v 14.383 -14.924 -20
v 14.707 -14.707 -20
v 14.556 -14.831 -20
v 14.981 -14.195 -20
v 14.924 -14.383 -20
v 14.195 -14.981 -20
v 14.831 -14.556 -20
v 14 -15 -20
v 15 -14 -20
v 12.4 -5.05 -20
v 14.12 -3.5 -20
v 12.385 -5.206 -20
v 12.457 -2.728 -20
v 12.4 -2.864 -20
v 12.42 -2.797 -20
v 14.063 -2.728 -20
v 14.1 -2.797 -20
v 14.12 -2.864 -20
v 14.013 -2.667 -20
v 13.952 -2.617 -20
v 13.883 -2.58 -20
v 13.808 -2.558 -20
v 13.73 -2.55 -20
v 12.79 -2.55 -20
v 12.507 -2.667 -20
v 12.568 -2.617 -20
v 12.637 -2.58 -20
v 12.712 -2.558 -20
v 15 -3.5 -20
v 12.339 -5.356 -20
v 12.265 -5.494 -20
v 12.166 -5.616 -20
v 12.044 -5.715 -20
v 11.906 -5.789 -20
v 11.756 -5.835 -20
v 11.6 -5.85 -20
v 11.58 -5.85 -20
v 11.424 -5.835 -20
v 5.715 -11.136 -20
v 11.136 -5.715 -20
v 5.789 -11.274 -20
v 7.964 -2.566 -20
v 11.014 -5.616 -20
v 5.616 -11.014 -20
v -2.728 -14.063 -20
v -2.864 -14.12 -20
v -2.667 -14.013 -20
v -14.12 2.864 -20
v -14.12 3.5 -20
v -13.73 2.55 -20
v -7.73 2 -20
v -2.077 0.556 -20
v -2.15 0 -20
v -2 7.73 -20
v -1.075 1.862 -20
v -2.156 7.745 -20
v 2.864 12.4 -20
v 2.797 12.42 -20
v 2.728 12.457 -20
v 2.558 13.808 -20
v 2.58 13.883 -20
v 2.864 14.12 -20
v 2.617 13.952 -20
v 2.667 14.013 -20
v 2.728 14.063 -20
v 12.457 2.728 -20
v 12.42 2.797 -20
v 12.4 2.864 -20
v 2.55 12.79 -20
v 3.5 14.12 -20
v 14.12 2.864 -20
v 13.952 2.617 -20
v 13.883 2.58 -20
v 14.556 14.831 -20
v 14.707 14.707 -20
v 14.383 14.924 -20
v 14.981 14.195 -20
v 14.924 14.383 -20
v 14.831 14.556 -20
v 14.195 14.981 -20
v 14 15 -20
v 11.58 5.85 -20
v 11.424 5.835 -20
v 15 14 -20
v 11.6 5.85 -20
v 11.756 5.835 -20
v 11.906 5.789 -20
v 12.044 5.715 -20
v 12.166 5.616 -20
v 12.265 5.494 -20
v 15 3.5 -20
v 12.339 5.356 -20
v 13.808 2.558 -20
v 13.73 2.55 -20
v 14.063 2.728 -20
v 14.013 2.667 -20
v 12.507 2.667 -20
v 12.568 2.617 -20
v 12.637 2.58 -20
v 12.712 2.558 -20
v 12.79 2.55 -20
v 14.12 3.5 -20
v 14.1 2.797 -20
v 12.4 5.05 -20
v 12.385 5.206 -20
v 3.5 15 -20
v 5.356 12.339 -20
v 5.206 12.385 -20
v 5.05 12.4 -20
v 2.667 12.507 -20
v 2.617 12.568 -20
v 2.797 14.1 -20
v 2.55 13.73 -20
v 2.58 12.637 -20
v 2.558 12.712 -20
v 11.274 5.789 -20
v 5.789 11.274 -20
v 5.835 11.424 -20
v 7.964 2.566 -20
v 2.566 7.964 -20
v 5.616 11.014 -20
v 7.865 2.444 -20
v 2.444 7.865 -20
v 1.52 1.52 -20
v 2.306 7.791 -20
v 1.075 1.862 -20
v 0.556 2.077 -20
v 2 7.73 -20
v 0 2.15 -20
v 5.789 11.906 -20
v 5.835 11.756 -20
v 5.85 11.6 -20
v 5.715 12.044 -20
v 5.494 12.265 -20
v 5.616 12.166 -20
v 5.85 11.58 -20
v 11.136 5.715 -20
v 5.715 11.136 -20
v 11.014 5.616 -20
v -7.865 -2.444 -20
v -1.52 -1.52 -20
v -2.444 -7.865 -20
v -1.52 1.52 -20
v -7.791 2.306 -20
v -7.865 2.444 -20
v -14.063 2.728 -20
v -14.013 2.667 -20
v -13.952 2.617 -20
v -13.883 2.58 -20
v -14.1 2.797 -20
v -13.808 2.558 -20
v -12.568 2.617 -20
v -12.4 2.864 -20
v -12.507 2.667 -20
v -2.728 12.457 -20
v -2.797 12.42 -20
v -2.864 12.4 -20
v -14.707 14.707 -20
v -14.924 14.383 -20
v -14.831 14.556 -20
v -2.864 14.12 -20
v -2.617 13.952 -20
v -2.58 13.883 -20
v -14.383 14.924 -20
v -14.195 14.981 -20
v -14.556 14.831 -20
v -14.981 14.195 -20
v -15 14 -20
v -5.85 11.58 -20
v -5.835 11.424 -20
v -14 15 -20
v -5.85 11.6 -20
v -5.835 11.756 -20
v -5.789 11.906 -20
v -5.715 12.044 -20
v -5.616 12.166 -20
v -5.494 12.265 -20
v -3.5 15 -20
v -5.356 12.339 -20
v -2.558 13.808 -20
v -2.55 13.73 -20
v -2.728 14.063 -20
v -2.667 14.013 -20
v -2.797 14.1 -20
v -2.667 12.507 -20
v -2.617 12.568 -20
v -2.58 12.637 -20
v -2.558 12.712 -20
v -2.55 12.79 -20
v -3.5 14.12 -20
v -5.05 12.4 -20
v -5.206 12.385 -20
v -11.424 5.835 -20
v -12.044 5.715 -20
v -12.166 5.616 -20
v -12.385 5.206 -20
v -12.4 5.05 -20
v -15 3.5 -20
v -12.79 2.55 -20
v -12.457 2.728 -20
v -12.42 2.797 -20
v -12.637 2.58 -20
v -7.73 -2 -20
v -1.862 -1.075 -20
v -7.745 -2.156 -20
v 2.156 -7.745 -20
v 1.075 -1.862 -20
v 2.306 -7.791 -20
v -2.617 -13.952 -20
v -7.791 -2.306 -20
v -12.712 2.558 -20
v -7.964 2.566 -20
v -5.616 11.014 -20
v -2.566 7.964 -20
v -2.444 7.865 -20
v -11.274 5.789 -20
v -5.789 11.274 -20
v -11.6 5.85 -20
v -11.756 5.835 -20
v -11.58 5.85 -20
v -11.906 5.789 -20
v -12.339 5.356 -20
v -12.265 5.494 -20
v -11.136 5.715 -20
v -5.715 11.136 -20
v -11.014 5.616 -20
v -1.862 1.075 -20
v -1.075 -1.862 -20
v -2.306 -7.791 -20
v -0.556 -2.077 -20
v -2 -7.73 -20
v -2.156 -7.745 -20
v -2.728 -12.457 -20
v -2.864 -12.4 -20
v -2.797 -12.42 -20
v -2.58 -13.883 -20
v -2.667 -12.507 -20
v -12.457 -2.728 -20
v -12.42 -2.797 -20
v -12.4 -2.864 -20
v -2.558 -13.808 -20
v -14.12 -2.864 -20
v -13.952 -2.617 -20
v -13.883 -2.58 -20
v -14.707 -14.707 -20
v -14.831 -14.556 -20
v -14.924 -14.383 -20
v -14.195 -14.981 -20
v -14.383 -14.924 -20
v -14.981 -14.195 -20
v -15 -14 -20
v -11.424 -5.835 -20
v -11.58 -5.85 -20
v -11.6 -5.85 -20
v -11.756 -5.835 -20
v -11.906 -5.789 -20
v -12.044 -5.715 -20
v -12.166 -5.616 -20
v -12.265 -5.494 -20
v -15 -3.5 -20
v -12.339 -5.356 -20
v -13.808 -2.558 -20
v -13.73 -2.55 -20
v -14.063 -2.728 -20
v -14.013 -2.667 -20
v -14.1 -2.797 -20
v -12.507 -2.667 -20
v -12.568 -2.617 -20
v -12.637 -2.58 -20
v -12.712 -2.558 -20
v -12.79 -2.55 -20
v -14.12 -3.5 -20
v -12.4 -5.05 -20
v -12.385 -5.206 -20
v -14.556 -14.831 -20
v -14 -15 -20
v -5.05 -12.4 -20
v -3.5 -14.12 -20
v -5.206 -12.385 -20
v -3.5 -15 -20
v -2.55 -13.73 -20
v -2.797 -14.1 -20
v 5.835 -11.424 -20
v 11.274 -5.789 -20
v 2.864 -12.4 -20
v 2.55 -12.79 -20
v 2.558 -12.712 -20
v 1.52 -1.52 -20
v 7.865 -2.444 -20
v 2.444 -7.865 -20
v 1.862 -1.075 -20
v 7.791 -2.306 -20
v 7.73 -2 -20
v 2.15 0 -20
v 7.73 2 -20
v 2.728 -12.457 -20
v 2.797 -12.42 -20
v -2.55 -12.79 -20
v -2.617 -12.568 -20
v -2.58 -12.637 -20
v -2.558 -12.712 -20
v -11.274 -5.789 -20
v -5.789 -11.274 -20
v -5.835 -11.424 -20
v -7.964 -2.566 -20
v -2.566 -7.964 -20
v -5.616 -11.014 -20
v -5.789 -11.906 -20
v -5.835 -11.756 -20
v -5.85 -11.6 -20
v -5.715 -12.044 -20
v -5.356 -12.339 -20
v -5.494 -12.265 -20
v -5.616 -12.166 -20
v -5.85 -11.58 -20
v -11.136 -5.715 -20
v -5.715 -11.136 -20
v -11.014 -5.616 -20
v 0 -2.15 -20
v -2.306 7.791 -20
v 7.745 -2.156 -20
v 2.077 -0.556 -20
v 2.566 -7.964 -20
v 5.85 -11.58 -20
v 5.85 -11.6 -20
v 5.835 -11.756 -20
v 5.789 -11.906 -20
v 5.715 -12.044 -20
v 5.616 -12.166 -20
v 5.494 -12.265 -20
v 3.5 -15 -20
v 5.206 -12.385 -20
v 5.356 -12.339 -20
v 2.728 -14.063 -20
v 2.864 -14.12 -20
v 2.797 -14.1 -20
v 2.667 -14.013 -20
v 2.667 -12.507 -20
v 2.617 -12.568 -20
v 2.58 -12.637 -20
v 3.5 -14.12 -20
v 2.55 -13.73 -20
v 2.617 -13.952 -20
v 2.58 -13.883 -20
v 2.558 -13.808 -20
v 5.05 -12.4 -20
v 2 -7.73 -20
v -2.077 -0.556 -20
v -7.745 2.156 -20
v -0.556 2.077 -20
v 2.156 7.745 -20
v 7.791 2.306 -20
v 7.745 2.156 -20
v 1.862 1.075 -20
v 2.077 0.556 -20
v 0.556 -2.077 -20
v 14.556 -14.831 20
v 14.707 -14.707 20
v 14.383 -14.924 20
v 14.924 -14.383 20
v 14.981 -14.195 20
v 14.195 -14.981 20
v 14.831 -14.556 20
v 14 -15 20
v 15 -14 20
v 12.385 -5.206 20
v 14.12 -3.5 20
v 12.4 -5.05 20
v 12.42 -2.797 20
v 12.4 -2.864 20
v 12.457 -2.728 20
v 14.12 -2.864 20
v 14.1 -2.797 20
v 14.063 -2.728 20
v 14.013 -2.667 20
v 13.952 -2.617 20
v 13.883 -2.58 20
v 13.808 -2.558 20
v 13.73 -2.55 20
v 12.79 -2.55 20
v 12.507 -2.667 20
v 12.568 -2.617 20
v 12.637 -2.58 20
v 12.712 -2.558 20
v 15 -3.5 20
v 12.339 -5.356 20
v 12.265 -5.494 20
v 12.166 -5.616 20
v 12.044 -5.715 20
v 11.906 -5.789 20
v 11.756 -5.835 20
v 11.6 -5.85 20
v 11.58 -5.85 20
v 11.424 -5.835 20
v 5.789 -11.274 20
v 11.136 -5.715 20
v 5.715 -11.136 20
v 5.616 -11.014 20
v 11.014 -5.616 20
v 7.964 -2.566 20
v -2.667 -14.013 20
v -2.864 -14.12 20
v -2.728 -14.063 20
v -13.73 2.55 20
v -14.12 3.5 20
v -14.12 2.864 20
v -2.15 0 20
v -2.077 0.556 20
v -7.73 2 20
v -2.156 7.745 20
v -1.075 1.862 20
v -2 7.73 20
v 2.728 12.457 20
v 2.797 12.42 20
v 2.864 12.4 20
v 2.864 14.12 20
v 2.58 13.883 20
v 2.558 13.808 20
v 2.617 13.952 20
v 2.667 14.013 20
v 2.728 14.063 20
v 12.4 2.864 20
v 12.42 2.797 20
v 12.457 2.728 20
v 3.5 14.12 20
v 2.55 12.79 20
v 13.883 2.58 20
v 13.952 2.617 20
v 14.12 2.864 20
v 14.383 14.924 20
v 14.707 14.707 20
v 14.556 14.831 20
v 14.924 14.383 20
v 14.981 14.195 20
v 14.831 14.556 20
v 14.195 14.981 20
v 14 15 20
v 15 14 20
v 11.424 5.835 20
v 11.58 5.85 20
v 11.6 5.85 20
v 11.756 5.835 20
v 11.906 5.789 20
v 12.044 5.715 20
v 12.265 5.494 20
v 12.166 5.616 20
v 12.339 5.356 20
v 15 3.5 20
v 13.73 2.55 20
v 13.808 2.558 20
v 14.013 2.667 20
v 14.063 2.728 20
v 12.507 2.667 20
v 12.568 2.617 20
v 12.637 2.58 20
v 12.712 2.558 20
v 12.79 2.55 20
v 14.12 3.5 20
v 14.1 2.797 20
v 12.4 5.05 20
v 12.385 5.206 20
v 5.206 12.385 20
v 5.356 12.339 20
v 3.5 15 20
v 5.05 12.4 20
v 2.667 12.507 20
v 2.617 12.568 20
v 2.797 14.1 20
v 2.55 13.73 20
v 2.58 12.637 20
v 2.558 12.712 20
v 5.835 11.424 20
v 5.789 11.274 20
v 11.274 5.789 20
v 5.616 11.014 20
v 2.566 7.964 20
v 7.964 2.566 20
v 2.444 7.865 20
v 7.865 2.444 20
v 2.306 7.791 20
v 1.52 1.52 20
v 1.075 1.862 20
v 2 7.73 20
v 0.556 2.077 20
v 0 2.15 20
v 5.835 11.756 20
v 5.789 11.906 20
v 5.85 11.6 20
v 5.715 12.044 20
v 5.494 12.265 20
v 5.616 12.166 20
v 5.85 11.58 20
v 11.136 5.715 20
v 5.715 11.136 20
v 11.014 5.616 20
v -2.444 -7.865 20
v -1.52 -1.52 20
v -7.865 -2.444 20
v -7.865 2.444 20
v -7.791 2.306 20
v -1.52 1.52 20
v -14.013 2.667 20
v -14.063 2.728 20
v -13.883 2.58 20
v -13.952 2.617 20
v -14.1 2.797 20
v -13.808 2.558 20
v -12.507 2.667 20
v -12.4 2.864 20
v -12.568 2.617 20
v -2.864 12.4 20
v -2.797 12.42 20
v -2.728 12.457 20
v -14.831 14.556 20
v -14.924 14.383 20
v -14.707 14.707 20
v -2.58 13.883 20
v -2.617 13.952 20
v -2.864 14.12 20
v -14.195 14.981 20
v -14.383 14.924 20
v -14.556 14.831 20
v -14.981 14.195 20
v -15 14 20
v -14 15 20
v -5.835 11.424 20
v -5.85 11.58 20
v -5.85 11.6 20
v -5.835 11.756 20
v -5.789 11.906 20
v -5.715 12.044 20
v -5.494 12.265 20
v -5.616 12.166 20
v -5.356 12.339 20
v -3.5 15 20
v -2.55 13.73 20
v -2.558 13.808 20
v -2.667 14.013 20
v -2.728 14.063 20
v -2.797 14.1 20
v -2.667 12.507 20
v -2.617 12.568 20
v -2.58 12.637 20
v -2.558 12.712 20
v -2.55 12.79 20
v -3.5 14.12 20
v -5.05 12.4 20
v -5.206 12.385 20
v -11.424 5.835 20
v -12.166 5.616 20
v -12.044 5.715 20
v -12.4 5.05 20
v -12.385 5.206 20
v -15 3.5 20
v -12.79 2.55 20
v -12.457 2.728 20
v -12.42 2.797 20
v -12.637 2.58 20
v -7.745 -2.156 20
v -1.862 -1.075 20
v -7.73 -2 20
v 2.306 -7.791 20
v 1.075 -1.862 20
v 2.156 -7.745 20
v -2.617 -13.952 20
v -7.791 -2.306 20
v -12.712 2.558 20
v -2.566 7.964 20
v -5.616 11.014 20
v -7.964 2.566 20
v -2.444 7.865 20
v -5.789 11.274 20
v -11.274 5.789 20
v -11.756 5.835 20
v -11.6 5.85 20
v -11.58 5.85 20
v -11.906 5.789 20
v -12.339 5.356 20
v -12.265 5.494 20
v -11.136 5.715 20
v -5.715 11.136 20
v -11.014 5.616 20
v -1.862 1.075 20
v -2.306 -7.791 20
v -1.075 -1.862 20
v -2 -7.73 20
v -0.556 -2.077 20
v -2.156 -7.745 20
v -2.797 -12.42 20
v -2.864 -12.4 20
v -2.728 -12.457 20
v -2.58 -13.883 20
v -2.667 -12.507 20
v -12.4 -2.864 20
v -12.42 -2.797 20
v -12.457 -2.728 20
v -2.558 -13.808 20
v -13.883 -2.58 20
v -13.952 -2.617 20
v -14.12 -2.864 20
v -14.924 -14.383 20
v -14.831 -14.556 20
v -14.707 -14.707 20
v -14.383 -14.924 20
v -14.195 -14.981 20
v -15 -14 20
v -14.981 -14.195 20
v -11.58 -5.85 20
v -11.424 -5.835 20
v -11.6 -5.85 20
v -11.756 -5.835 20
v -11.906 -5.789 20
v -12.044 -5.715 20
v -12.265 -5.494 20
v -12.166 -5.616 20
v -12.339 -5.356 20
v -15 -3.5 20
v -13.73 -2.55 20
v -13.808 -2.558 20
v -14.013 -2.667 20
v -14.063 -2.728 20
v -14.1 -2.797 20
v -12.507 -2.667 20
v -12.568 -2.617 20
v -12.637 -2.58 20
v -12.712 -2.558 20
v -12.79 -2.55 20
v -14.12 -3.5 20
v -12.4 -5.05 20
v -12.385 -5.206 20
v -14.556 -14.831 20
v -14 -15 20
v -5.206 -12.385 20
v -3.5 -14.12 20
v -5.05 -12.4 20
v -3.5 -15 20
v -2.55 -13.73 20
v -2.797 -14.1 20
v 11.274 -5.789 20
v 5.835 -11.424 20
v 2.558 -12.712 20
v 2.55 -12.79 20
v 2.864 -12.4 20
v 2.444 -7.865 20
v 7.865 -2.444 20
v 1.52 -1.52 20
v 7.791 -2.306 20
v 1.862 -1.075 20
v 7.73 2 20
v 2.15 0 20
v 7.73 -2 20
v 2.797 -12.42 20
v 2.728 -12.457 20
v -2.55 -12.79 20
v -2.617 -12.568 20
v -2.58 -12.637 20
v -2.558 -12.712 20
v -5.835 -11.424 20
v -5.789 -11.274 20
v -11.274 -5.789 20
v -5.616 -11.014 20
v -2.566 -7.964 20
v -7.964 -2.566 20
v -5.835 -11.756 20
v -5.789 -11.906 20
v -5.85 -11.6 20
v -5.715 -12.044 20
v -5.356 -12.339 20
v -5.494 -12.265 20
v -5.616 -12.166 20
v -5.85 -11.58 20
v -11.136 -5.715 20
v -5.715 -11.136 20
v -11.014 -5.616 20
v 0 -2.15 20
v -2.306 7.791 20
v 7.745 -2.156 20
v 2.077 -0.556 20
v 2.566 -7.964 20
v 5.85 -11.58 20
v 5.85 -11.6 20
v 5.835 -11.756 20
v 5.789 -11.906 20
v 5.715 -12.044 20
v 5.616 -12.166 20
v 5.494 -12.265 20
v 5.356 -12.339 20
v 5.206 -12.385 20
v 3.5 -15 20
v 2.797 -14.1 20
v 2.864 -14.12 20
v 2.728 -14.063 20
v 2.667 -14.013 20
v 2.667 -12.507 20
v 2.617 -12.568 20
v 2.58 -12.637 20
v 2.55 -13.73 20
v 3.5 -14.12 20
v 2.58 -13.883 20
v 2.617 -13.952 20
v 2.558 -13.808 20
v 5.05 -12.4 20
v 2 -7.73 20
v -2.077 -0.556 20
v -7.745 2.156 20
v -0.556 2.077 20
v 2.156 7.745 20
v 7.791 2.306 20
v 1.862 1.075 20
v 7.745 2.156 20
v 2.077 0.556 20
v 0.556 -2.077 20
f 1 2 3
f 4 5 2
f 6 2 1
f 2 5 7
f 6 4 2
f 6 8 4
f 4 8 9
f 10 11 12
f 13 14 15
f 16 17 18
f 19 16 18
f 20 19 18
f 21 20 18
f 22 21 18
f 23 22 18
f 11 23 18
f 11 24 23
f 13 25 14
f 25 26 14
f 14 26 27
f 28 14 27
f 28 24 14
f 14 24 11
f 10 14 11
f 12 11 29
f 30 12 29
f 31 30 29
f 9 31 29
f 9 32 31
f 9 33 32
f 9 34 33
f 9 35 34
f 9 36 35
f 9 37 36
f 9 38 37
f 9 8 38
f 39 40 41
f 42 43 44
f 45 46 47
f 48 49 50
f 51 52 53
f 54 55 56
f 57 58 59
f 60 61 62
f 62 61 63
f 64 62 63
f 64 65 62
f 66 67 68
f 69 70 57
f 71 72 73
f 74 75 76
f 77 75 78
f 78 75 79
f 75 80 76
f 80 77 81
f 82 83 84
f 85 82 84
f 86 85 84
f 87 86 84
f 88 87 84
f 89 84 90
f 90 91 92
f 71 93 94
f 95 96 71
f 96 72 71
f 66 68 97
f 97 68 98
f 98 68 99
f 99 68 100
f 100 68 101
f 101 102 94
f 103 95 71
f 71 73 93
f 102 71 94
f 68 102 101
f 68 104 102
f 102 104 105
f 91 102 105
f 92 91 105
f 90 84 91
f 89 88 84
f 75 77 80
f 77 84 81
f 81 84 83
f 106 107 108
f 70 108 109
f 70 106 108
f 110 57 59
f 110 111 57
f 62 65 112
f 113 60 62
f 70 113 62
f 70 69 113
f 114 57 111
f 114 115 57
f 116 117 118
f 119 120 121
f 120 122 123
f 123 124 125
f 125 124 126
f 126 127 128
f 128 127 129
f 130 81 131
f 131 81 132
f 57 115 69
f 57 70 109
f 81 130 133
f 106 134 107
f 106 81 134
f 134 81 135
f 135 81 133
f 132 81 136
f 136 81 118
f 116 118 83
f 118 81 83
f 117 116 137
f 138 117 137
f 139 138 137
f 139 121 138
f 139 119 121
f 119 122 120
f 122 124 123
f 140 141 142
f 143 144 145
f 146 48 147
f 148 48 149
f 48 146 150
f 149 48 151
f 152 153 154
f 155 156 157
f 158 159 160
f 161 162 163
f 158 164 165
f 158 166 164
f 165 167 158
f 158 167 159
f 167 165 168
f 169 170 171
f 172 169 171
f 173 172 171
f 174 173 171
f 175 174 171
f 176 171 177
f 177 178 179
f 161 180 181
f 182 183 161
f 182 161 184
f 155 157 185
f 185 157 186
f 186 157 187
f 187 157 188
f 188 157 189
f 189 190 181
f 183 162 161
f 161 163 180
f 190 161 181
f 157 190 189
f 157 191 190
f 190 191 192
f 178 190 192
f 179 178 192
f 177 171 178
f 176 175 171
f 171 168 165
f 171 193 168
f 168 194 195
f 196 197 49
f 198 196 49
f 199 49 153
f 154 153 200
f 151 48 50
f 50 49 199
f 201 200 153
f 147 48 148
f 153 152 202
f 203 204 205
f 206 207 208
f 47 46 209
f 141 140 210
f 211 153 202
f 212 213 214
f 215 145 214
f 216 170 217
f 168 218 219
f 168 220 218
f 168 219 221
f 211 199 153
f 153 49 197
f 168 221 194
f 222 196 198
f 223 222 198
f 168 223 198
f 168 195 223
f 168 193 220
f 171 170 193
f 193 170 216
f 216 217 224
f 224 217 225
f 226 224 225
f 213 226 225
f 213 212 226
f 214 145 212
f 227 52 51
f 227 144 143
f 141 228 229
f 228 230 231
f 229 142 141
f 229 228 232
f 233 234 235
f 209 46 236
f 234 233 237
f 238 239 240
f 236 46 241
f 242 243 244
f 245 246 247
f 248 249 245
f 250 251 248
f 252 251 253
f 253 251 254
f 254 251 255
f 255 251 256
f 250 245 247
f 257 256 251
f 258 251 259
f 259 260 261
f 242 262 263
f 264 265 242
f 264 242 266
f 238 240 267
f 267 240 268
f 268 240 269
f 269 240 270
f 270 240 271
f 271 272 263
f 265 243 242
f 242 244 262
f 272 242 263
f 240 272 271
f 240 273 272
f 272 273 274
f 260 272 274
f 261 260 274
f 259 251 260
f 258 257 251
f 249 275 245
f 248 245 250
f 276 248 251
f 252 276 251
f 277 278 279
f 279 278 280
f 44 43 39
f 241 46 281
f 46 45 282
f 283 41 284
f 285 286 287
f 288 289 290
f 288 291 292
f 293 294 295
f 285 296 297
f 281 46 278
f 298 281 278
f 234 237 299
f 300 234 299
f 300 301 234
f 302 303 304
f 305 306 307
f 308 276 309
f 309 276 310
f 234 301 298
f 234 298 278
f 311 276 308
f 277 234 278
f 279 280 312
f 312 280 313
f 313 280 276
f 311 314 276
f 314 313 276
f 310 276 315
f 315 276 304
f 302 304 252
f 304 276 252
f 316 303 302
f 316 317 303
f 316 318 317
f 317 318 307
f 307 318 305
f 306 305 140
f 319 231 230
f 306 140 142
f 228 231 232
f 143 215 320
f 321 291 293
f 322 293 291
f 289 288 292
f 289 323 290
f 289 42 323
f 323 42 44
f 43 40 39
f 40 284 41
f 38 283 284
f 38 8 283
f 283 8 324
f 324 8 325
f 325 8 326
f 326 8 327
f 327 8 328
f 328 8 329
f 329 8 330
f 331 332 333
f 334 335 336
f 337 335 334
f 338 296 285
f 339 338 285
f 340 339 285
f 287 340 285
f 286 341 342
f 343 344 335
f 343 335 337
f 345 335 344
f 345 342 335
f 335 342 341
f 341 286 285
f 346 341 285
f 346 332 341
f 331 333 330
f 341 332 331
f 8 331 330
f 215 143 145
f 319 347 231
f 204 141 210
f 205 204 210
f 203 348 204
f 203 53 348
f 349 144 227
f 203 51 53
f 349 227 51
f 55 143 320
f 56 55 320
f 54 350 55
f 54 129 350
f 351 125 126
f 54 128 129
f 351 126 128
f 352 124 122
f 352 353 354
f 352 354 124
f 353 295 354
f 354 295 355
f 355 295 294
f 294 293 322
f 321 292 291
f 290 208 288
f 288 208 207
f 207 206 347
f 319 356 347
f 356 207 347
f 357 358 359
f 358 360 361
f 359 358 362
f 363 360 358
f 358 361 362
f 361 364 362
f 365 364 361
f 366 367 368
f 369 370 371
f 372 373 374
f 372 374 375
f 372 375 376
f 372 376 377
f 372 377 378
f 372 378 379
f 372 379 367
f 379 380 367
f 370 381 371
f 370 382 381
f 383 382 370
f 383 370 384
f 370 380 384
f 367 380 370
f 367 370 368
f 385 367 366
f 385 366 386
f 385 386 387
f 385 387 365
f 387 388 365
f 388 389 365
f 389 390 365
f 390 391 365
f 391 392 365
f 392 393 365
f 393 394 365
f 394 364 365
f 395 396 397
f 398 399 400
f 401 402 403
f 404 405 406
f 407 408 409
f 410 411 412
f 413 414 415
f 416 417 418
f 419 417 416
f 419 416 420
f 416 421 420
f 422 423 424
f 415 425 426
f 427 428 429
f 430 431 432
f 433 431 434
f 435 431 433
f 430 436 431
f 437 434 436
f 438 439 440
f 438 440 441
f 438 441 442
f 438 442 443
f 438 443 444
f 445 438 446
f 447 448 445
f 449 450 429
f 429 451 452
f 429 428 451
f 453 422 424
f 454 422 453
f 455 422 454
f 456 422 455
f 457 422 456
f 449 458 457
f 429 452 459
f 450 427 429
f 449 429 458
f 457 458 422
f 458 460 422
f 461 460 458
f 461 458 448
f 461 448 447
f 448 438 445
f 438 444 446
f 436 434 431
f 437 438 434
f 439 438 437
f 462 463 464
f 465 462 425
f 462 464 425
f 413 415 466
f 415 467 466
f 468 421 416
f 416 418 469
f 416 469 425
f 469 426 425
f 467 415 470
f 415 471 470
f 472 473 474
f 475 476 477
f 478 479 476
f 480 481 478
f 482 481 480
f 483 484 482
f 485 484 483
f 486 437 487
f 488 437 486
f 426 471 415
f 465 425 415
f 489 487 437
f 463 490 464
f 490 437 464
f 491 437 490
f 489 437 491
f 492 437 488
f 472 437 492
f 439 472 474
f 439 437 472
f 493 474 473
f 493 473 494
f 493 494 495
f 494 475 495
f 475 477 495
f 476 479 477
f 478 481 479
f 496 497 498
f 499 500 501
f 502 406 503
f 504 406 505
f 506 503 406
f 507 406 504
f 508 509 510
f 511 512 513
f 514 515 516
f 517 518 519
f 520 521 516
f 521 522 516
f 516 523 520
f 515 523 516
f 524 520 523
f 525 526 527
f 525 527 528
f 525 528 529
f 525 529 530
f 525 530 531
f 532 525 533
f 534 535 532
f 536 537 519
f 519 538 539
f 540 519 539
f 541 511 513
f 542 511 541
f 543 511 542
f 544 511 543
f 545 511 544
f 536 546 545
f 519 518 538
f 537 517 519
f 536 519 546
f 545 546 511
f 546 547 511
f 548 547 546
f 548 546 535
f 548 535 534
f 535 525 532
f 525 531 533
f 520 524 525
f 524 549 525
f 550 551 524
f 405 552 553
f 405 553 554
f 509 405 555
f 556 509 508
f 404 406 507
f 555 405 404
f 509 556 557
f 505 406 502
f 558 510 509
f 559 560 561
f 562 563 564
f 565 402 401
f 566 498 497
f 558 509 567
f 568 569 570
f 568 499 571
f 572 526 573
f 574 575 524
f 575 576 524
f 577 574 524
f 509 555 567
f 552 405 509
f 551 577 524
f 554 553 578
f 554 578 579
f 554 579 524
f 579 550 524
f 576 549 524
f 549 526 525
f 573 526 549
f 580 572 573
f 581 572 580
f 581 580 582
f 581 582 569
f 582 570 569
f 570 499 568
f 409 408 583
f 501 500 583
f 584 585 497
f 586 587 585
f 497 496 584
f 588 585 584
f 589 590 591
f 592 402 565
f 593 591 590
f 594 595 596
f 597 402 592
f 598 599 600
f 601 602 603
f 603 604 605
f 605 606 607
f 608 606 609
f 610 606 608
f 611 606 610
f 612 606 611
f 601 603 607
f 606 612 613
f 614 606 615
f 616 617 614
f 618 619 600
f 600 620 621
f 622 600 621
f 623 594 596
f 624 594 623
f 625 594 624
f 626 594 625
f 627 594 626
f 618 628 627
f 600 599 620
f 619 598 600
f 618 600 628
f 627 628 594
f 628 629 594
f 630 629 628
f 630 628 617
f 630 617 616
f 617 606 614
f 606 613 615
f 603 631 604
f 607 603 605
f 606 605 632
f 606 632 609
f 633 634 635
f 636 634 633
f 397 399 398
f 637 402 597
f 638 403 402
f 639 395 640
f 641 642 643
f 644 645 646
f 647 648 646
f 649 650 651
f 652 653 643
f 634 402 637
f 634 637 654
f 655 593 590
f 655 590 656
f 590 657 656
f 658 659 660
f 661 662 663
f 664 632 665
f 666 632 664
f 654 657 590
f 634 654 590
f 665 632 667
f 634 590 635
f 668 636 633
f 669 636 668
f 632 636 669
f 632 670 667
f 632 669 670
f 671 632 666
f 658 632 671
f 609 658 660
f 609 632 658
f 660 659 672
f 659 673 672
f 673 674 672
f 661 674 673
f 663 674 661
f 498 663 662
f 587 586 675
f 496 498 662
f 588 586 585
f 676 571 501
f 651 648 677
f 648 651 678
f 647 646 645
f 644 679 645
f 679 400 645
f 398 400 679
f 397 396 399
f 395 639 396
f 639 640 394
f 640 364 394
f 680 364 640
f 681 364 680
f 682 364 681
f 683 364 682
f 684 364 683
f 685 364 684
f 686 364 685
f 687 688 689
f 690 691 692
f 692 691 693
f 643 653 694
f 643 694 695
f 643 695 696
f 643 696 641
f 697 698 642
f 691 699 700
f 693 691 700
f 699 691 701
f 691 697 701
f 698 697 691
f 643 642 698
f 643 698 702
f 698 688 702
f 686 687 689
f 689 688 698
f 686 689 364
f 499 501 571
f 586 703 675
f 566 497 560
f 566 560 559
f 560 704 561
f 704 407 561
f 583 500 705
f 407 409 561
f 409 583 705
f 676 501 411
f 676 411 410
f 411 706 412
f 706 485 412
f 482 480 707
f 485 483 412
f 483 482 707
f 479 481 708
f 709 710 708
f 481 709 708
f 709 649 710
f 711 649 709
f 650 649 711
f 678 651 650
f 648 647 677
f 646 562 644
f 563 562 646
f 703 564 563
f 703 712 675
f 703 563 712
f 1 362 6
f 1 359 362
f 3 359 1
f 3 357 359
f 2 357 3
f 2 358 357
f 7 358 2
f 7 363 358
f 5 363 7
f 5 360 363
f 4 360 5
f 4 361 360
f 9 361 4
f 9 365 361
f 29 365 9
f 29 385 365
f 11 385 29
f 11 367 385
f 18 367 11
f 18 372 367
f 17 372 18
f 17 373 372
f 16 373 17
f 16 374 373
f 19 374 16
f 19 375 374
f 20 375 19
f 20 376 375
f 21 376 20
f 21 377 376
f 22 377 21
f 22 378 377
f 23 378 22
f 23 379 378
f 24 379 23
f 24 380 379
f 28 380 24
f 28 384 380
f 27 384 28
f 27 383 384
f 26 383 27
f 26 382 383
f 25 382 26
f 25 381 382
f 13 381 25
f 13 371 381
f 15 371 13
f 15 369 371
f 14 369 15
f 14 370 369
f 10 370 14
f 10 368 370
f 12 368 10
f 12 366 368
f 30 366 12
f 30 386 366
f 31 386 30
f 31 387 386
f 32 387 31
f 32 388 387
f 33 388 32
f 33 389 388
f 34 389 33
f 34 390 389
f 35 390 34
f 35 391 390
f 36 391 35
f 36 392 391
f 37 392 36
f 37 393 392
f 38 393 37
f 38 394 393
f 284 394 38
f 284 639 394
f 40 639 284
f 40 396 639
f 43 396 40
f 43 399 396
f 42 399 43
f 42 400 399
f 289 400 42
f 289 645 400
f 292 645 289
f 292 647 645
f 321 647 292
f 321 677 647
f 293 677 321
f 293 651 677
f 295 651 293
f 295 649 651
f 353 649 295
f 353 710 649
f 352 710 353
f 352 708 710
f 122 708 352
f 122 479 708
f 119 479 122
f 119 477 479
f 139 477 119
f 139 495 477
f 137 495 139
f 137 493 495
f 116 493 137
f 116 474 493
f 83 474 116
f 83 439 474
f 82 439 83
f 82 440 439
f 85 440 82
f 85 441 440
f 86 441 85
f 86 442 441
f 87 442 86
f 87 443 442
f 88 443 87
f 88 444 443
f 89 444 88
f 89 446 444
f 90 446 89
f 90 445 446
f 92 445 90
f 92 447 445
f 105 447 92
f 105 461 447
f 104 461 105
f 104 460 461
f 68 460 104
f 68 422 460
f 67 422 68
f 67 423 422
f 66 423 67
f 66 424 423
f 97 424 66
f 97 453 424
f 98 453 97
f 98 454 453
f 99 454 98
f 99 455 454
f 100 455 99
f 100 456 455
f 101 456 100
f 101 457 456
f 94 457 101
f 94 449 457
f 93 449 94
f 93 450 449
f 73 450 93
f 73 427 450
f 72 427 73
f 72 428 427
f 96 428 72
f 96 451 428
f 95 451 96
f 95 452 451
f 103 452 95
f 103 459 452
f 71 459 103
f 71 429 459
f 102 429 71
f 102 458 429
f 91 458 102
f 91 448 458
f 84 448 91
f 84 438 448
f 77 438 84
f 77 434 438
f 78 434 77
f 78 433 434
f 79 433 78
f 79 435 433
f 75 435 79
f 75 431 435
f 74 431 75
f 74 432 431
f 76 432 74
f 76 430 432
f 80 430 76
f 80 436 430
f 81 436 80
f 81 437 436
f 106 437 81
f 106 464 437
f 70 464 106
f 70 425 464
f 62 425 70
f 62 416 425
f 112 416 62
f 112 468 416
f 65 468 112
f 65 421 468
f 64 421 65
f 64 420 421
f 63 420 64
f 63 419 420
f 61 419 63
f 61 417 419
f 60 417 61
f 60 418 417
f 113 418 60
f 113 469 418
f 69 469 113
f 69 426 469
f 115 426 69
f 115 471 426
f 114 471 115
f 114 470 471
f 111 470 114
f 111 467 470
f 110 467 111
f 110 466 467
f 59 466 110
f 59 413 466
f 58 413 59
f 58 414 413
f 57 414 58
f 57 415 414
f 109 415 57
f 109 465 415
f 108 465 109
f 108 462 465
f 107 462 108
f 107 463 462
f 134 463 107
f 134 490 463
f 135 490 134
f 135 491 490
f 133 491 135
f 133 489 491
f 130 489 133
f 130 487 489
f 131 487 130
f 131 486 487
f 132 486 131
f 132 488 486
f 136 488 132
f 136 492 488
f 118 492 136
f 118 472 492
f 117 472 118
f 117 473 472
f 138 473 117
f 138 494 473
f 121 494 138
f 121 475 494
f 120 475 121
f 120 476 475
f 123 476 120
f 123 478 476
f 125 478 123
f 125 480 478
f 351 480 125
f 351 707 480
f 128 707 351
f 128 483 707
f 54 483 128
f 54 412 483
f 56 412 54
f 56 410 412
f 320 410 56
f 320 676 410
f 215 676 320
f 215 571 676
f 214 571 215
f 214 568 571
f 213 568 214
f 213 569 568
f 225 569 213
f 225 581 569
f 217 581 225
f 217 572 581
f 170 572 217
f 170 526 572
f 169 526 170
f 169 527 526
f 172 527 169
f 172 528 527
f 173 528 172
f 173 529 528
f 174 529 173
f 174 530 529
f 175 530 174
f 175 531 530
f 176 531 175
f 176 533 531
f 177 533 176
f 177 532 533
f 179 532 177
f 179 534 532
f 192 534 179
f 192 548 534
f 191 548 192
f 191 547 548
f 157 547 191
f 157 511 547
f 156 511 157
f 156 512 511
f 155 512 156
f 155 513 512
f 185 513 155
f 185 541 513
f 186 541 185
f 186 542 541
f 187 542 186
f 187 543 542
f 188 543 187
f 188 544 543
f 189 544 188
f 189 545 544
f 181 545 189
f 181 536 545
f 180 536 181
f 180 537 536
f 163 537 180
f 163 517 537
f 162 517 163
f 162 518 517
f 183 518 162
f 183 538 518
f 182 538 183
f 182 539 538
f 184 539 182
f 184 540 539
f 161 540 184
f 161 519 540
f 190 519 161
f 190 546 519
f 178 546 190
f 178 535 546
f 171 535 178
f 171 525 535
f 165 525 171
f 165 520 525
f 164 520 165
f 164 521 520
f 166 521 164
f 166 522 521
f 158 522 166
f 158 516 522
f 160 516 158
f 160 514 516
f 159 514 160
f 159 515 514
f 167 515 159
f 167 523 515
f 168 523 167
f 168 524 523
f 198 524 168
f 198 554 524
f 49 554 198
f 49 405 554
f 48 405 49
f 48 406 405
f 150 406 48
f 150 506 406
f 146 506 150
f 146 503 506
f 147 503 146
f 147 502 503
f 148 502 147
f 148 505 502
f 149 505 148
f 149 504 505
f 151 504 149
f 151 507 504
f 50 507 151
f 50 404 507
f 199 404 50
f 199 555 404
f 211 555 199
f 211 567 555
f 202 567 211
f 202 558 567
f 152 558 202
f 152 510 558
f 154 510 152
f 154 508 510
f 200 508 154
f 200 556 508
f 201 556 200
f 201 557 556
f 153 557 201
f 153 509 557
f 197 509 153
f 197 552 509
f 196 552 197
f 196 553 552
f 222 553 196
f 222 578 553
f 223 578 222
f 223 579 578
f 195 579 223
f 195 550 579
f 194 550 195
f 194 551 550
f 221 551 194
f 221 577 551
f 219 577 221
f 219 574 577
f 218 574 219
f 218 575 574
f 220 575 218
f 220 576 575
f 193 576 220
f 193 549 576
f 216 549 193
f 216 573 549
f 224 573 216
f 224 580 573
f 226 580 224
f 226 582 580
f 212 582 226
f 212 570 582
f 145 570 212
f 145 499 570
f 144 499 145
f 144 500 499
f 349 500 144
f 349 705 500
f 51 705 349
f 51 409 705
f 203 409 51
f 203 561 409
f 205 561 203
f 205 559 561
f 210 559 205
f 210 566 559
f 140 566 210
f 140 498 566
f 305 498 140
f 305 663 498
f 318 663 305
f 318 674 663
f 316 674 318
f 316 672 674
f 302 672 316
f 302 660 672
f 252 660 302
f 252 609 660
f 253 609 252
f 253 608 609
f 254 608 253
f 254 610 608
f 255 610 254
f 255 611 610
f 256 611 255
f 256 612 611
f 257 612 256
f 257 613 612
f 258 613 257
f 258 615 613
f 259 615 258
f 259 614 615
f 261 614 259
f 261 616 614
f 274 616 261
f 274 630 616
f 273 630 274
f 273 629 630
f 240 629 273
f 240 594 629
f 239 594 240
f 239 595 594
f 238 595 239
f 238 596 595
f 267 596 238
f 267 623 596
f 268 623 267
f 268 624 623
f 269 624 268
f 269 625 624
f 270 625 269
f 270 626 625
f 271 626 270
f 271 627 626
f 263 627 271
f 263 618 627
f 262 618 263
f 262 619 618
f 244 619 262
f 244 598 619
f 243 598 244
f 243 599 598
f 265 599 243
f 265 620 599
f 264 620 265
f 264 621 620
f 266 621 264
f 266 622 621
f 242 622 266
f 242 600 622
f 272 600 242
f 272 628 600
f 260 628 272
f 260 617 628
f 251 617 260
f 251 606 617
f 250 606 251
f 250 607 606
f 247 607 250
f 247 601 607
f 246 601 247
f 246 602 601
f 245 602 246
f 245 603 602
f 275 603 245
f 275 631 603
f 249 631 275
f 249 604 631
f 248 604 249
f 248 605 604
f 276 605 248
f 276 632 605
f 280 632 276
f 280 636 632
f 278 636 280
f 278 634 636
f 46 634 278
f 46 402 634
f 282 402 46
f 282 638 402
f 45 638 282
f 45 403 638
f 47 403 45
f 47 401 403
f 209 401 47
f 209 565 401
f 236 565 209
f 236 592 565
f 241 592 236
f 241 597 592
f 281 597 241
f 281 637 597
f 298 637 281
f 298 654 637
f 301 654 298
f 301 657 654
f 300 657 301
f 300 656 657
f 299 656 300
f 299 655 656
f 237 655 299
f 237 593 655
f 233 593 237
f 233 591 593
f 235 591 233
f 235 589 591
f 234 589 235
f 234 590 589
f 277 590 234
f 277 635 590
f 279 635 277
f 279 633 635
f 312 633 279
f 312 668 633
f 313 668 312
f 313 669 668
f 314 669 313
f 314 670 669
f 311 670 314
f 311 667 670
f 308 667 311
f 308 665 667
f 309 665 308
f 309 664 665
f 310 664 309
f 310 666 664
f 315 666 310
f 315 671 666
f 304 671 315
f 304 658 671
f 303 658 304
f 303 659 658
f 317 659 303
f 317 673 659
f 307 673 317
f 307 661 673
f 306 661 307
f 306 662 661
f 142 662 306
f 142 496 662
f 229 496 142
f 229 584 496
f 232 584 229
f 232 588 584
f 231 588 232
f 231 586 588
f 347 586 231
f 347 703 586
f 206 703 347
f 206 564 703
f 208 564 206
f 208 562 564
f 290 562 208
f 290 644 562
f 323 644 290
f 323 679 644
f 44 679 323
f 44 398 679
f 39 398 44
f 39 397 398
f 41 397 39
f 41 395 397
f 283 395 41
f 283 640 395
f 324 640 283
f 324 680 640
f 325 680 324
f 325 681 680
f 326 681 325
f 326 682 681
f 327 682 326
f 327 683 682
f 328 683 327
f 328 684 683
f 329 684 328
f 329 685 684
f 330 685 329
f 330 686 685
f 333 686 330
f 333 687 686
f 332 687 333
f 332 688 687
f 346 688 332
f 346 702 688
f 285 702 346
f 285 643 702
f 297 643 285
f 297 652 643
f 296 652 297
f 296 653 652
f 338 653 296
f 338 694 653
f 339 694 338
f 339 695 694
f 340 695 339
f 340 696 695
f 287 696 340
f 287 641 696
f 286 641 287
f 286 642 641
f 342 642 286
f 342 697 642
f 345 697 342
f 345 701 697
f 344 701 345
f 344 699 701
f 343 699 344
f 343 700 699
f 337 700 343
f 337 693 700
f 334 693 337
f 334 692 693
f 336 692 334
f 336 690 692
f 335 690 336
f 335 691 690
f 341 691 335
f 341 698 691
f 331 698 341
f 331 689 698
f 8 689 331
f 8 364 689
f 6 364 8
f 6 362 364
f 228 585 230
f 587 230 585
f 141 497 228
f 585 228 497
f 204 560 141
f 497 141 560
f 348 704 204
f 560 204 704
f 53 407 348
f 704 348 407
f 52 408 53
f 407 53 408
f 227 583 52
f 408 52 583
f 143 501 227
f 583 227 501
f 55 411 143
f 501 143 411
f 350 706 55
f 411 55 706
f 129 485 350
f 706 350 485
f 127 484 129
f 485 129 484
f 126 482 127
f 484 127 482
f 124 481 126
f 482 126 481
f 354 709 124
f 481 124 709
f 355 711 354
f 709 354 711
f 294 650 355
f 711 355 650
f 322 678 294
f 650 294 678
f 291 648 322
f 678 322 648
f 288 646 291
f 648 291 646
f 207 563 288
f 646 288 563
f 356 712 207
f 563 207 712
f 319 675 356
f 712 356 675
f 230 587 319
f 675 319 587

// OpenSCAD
/** 
 * @file
 * Generic library for fractional T-Slot extrusions.
 *
 * Creative Commons Share Alike 3.0
 * Copyright (c) 2014 Manuel García
 *
 * Original library (David Lee Miller)
 * https://www.thingiverse.com/thing:136430
 */ 

ProfileCore = 4.3;     // Profile core Ø (Default M5).
minkR_TS = 0.04 * 20;  // Minkowski radius for the T-Slot.
minkR_IC = 0.075 * 20; // Minkowski radius for the inner cutout.
minkR_PF = 0.05 * 20;  // Minkowski radius for the profile corners.

2020Profile(40);
//2040Profile(100);
//2060Profile(100);
//2080Profile(100);
//4040Profile(100);
//4060Profile(100);
//4080Profile(100);

module fillet(rad) {
  translate([-rad, -rad, 0])
  difference() {
    translate([0, 0, 0]) square([rad + 0.01, rad + 0.01]);
    circle(r = rad, center = true, $fn = 32);
  }
}

module insideCutout() {
  minkowski() {
    translate([0, 0, 0]) circle(r = minkR_IC, center = true, $fn = 32);
    hull() {
      square([0.2 * 20 - minkR_IC, 0.645 * 20 - 2 * minkR_IC], center = true);
      square([0.8 * 20 - 2 * minkR_IC, 0.001 * 20], center = true);
    }
  }
}

module doubleCutout() {
  union() {
    minkowski() {
      translate([0, 0, 0]) circle(r = minkR_IC, center = true, $fn = 32);
      union() {
        rotate([0, 0, 0]) hull() {
          translate([-0.5 * 20, 0, 0]) hull() {
            square([0.2 * 20 - minkR_IC, 0.645 * 20 - 2 * minkR_IC], center = true);
            square([0.8 * 20 - 2 * minkR_IC, 0.001 * 20], center = true);
          }
          translate([0.5 * 20, 0, 0]) hull() {
            square([0.2 * 20 - minkR_IC, 0.645 * 20 - 2 * minkR_IC], center = true);
            square([0.8 * 20 - 2 * minkR_IC, 0.001 * 20], center = true);
          }
        }
        rotate([0, 0, 90]) hull() {
          translate([-0.5 * 20, 0, 0]) hull() {
            square([0.2 * 20 - minkR_IC, 0.645 * 20 - 2 * minkR_IC], center = true);
            square([0.8 * 20 - 2 * minkR_IC, 0.001 * 20], center = true);
          }
          translate([0.5 * 20, 0, 0]) hull() {
            square([0.2 * 20 - minkR_IC, 0.645 * 20 - 2 * minkR_IC], center = true);
            square([0.8 * 20 - 2 * minkR_IC, 0.001 * 20], center = true);
          }
        }
      }
    }
    rotate([0, 0, 0]) translate([-0.645 * 20 / 2, -0.645 * 20 / 2, 0]) fillet(minkR_IC);
    rotate([0, 0, 180]) translate([-0.645 * 20 / 2, -0.645 * 20 / 2, 0]) fillet(minkR_IC);
    rotate([0, 0, 90]) translate([-0.645 * 20 / 2, -0.645 * 20 / 2, 0]) fillet(minkR_IC);
    rotate([0, 0, -90]) translate([-0.645 * 20 / 2, -0.645 * 20 / 2, 0]) fillet(minkR_IC);
  }
}

module tSlot() {
  union() {
    translate([minkR_TS, 0, 0])
    minkowski() {
      translate([0, 0, 0]) circle(r = minkR_TS, center = true, $fn = 32);
      hull() {
        square([0.001 * 20, 0.585 * 20 - 2 * minkR_TS], center = true);
        translate([(0.233 * 20 - 2 * minkR_TS) / 2, 0, 0]) square([0.233 * 20 - 2 * minkR_TS, 0.2 * 20], center = true);
      }
    }
    translate([-0.255 * 20 / 2 + 0.01, 0, 0]) square(0.255 * 20, center = true);
    translate([-0.35 * 20 / 2 - 0.087 * 20 + 0.01, 0, 0]) square(0.35 * 20, center = true);
    translate([0, -0.255 * 20 / 2, 0]) fillet(minkR_TS / 2);
    translate([-0.087 * 20, -0.255 * 20 / 2, 0]) rotate([0, 0, 90]) fillet(minkR_TS / 2);
    scale([1, -1, 1]) translate([0, -0.255 * 20 / 2, 0]) fillet(minkR_TS / 2);
    scale([1, -1, 1]) translate([-0.087 * 20, -0.255 * 20 / 2, 0]) rotate([0, 0, 90]) fillet(minkR_TS / 2);
  }
}

module 2020Profile(height, core = ProfileCore) {
  linear_extrude(height = height, center = true)
  union() {
    difference() {
      minkowski() {
        translate([0, 0, 0]) circle(r = minkR_PF, center = true, $fn = 32);
        square([1 * 30 - 2 * minkR_PF, 1 * 30 - 2 * minkR_PF], center = true);
      }
      translate([0, 0, 0]) circle(r = core / 2, $fn = 24);
      translate([-0.5 * 30 + 0.087 * 30, 0, 0]) tSlot();
      rotate([0, 0, 180]) translate([-0.5 * 30 + 0.087 * 30, 0, 0]) tSlot();
      translate([0, -0.5 * 30 + 0.087 * 30, 0]) rotate([0, 0, 90]) tSlot();
      translate([0, 0.5 * 30 - 0.087 * 30, 0]) rotate([0, 0, -90]) tSlot();
    }
  }
}

module 2040Profile(height, core = ProfileCore) {
  linear_extrude(height = height, center = true)
  difference() {
    minkowski() {
      translate([0, 0, 0]) circle(r = minkR_PF, center = true, $fn = 32);
      square([1 * 20 - 2 * minkR_PF, 2 * 20 - 2 * minkR_PF], center = true);
    }
    translate([0, 0.5 * 20, 0]) circle(r = core / 2, $fn = 24);
    translate([0, -0.5 * 20, 0]) circle(r = core / 2, $fn = 24);
    translate([0, 0, 0]) insideCutout();
    translate([-0.5 * 20 + 0.087 * 20, 0.5 * 20, 0]) tSlot();
    rotate([0, 0, 180]) translate([-0.5 * 20 + 0.087 * 20, 0.5 * 20, 0]) tSlot();
    translate([-0.5 * 20 + 0.087 * 20, -0.5 * 20, 0]) tSlot();
    rotate([0, 0, 180]) translate([-0.5 * 20 + 0.087 * 20, -0.5 * 20, 0]) tSlot();
    translate([0, -1 * 20 + 0.087 * 20, 0]) rotate([0, 0, 90]) tSlot();
    translate([0, 1 * 20 - 0.087 * 20, 0]) rotate([0, 0, -90]) tSlot();
  }
}

module 2060Profile(height, core = ProfileCore) {
  linear_extrude(height = height, center = true)
  difference() {
    minkowski() {
      translate([0, 0, 0]) circle(r = minkR_PF, center = true, $fn = 32);
      square([1 * 20 - 2 * minkR_PF, 3 * 20 - 2 * minkR_PF], center = true);
    }
    translate([0, 0, 0]) circle(r = core / 2, $fn = 24);
    translate([0, 1 * 20, 0]) circle(r = core / 2, $fn = 24);
    translate([0, -1 * 20, 0]) circle(r = core / 2, $fn = 24);
    translate([0, -0.5 * 20, 0]) insideCutout();
    translate([0, 0.5 * 20, 0]) insideCutout();
    translate([-0.5 * 20 + 0.087 * 20, 0, 0]) tSlot();
    rotate([0, 0, 180]) translate([-0.5 * 20 + 0.087 * 20, 0, 0]) tSlot();
    translate([-0.5 * 20 + 0.087 * 20, 1 * 20, 0]) tSlot();
    rotate([0, 0, 180]) translate([-0.5 * 20 + 0.087 * 20, 1 * 20, 0]) tSlot();
    translate([-0.5 * 20 + 0.087 * 20, -1 * 20, 0]) tSlot();
    rotate([0, 0, 180]) translate([-0.5 * 20 + 0.087 * 20, -1 * 20, 0]) tSlot();
    translate([0, -1.5 * 20 + 0.087 * 20, 0]) rotate([0, 0, 90]) tSlot();
    translate([0, 1.5 * 20 - 0.087 * 20, 0]) rotate([0, 0, -90]) tSlot();
  }
}

module 2080Profile(height, core = ProfileCore) {
  linear_extrude(height = height, center = true)
  difference() {
    minkowski() {
      translate([0, 0, 0]) circle(r = minkR_PF, center = true, $fn = 32);
      square([1 * 20 - 2 * minkR_PF, 4 * 20 - 2 * minkR_PF], center = true);
    }
    translate([0, 0.5 * 20 + 20, 0]) circle(r = core / 2, $fn = 24);
    translate([0, 0.5 * 20 + 20 - 1 * 20, 0]) circle(r = core / 2, $fn = 24);
    translate([0, 0.5 * 20 + 20 - 2 * 20, 0]) circle(r = core / 2, $fn = 24);
    translate([0, 0.5 * 20 + 20 - 3 * 20, 0]) circle(r = core / 2, $fn = 24);
    translate([0, 0.5 * 20 + 20 - 0.5 * 20, 0]) insideCutout();
    translate([0, 0, 0]) insideCutout();
    translate([0, -(0.5 * 20 + 20) + 0.5 * 20, 0]) insideCutout();
    rotate([0, 0, 180]) translate([-0.5 * 20 + 0.087 * 20, -(0.5 * 20 + 20), 0]) tSlot();
    rotate([0, 0, 180]) translate([-0.5 * 20 + 0.087 * 20, -(0.5 * 20), 0]) tSlot();
    rotate([0, 0, 180]) translate([-0.5 * 20 + 0.087 * 20, 0.5 * 20, 0]) tSlot();
    rotate([0, 0, 180]) translate([-0.5 * 20 + 0.087 * 20, 0.5 * 20 + 20, 0]) tSlot();
    translate([-0.5 * 20 + 0.087 * 20, 0.5 * 20 + 20, 0]) tSlot();
    translate([-0.5 * 20 + 0.087 * 20, 0.5 * 20, 0]) tSlot();
    translate([-0.5 * 20 + 0.087 * 20, -(0.5 * 20), 0]) tSlot();
    translate([-0.5 * 20 + 0.087 * 20, -(0.5 * 20 + 20), 0]) tSlot();
    translate([0, -2 * 20 + 0.087 * 20, 0]) rotate([0, 0, 90]) tSlot();
    translate([0, 2 * 20 - 0.087 * 20, 0]) rotate([0, 0, -90]) tSlot();
  }
}

module 4040Profile(height, core = ProfileCore) {
  linear_extrude(height = height, center = true)
  difference() {
    minkowski() {
      translate([0, 0, 0]) circle(r = minkR_PF, center = true, $fn = 32);
      square([2 * 20 - 2 * minkR_PF, 2 * 20 - 2 * minkR_PF], center = true);
    }
    translate([0.5 * 20, 0.5 * 20, 0]) circle(r = core / 2, $fn = 24);
    translate([-0.5 * 20, 0.5 * 20, 0]) circle(r = core / 2, $fn = 24);
    translate([0.5 * 20, -0.5 * 20, 0]) circle(r = core / 2, $fn = 24);
    translate([-0.5 * 20, -0.5 * 20, 0]) circle(r = core / 2, $fn = 24);
    translate([0, 0, 0]) doubleCutout();
    translate([-1 * 20 + 0.087 * 20, 0.5 * 20, 0]) tSlot();
    rotate([0, 0, 180]) translate([-1 * 20 + 0.087 * 20, 0.5 * 20, 0]) tSlot();
    translate([-1 * 20 + 0.087 * 20, -0.5 * 20, 0]) tSlot();
    rotate([0, 0, 180]) translate([-1 * 20 + 0.087 * 20, -0.5 * 20, 0]) tSlot();
    translate([-0.5 * 20, 1 * 20 - 0.087 * 20, 0]) rotate([0, 0, -90]) tSlot();
    rotate([0, 0, 180]) translate([-0.5 * 20, 1 * 20 - 0.087 * 20, 0]) rotate([0, 0, -90]) tSlot();
    translate([0.5 * 20, 1 * 20 - 0.087 * 20, 0]) rotate([0, 0, -90]) tSlot();
    rotate([0, 0, 180]) translate([0.5 * 20, 1 * 20 - 0.087 * 20, 0]) rotate([0, 0, -90]) tSlot();
  }
}

module 4060Profile(height, core = ProfileCore) {
  linear_extrude(height = height, center = true)
  difference() {
    minkowski() {
      translate([0, 0, 0]) circle(r = minkR_PF, center = true, $fn = 32);
      square([2 * 20 - 2 * minkR_PF, 2 * 30 - 2 * minkR_PF], center = true);
    }
    translate([0.5 * 20, 1 * 20, 0]) circle(r = core / 2, $fn = 24);
    translate([-0.5 * 20, 1 * 20, 0]) circle(r = core / 2, $fn = 24);
    translate([0.5 * 20, 0, 0]) circle(r = core / 2, $fn = 24);
    translate([-0.5 * 20, 0, 0]) circle(r = core / 2, $fn = 24);
    translate([0.5 * 20, -1 * 20, 0]) circle(r = core / 2, $fn = 24);
    translate([-0.5 * 20, -1 * 20, 0]) circle(r = core / 2, $fn = 24);
    translate([-1 * 20 / 2, 1 * 20 / 2, 0]) insideCutout();
    translate([0, 2 * 20 / 2, 0]) rotate([0, 0, -90]) insideCutout();
    translate([1 * 20 / 2, 1 * 20 / 2, 0]) insideCutout();
    translate([0, -20 / 2, 0]) doubleCutout();
    translate([-1 * 20 + 0.087 * 20, 1 * 20, 0]) tSlot();
    translate([-1 * 20 + 0.087 * 20, 0, 0]) tSlot();
    translate([-1 * 20 + 0.087 * 20, -1 * 20, 0]) tSlot();
    rotate([0, 0, 180]) translate([-1 * 20 + 0.087 * 20, 1 * 20, 0]) tSlot();
    rotate([0, 0, 180]) translate([-1 * 20 + 0.087 * 20, 0, 0]) tSlot();
    rotate([0, 0, 180]) translate([-1 * 20 + 0.087 * 20, -1 * 20, 0]) tSlot();
    translate([-1 * 20 / 2, -1.5 * 20 + 0.087 * 20, 0]) rotate([0, 0, 90]) tSlot();
    translate([1 * 20 / 2, -1.5 * 20 + 0.087 * 20, 0]) rotate([0, 0, 90]) tSlot();
    translate([-1 * 20 / 2, 1.5 * 20 - 0.087 * 20, 0]) rotate([0, 0, -90]) tSlot();
    translate([1 * 20 / 2, 1.5 * 20 - 0.087 * 20, 0]) rotate([0, 0, -90]) tSlot();
  }
}

module 4080Profile(height, core = ProfileCore) {
  linear_extrude(height = height, center = true)
  difference() {
    minkowski() {
      translate([0, 0, 0]) circle(r = minkR_PF, center = true, $fn = 32);
      square([2 * 20 - 2 * minkR_PF, 4 * 20 - 2 * minkR_PF], center = true);
    }
    translate([0.5 * 20, 1.5 * 20, 0]) circle(r = core / 2, $fn = 24);
    translate([-0.5 * 20, 1.5 * 20, 0]) circle(r = core / 2, $fn = 24);
    translate([0.5 * 20, 0.5 * 20, 0]) circle(r = core / 2, $fn = 24);
    translate([-0.5 * 20, 0.5 * 20, 0]) circle(r = core / 2, $fn = 24);
    translate([0.5 * 20, -1.5 * 20, 0]) circle(r = core / 2, $fn = 24);
    translate([-0.5 * 20, -1.5 * 20, 0]) circle(r = core / 2, $fn = 24);
    translate([0.5 * 20, -0.5 * 20, 0]) circle(r = core / 2, $fn = 24);
    translate([-0.5 * 20, -0.5 * 20, 0]) circle(r = core / 2, $fn = 24);
    translate([0, 1 * 20, 0]) doubleCutout();
    translate([0, -1 * 20, 0]) doubleCutout();
    translate([0.5 * 20, 0, 0]) insideCutout();
    translate([-0.5 * 20, 0, 0]) insideCutout();
    translate([-1 * 20 + 0.087 * 20, 0.5 * 20, 0]) tSlot();
    rotate([0, 0, 180]) translate([-1 * 20 + 0.087 * 20, 0.5 * 20, 0]) tSlot();
    translate([-1 * 20 + 0.087 * 20, -0.5 * 20, 0]) tSlot();
    rotate([0, 0, 180]) translate([-1 * 20 + 0.087 * 20, -0.5 * 20, 0]) tSlot();
    translate([-1 * 20 + 0.087 * 20, 1.5 * 20, 0]) tSlot();
    rotate([0, 0, 180]) translate([-1 * 20 + 0.087 * 20, 1.5 * 20, 0]) tSlot();
    translate([-1 * 20 + 0.087 * 20, -1.5 * 20, 0]) tSlot();
    rotate([0, 0, 180]) translate([-1 * 20 + 0.087 * 20, -1.5 * 20, 0]) tSlot();
    translate([-0.5 * 20, 2 * 20 - 0.087 * 20, 0]) rotate([0, 0, -90]) tSlot();
    rotate([0, 0, 180]) translate([-0.5 * 20, 2 * 20 - 0.087 * 20, 0]) rotate([0, 0, -90]) tSlot();
    translate([0.5 * 20, 2 * 20 - 0.087 * 20, 0]) rotate([0, 0, -90]) tSlot();
    rotate([0, 0, 180]) translate([0.5 * 20, 2 * 20 - 0.087 * 20, 0]) rotate([0, 0, -90]) tSlot();
  }
}
